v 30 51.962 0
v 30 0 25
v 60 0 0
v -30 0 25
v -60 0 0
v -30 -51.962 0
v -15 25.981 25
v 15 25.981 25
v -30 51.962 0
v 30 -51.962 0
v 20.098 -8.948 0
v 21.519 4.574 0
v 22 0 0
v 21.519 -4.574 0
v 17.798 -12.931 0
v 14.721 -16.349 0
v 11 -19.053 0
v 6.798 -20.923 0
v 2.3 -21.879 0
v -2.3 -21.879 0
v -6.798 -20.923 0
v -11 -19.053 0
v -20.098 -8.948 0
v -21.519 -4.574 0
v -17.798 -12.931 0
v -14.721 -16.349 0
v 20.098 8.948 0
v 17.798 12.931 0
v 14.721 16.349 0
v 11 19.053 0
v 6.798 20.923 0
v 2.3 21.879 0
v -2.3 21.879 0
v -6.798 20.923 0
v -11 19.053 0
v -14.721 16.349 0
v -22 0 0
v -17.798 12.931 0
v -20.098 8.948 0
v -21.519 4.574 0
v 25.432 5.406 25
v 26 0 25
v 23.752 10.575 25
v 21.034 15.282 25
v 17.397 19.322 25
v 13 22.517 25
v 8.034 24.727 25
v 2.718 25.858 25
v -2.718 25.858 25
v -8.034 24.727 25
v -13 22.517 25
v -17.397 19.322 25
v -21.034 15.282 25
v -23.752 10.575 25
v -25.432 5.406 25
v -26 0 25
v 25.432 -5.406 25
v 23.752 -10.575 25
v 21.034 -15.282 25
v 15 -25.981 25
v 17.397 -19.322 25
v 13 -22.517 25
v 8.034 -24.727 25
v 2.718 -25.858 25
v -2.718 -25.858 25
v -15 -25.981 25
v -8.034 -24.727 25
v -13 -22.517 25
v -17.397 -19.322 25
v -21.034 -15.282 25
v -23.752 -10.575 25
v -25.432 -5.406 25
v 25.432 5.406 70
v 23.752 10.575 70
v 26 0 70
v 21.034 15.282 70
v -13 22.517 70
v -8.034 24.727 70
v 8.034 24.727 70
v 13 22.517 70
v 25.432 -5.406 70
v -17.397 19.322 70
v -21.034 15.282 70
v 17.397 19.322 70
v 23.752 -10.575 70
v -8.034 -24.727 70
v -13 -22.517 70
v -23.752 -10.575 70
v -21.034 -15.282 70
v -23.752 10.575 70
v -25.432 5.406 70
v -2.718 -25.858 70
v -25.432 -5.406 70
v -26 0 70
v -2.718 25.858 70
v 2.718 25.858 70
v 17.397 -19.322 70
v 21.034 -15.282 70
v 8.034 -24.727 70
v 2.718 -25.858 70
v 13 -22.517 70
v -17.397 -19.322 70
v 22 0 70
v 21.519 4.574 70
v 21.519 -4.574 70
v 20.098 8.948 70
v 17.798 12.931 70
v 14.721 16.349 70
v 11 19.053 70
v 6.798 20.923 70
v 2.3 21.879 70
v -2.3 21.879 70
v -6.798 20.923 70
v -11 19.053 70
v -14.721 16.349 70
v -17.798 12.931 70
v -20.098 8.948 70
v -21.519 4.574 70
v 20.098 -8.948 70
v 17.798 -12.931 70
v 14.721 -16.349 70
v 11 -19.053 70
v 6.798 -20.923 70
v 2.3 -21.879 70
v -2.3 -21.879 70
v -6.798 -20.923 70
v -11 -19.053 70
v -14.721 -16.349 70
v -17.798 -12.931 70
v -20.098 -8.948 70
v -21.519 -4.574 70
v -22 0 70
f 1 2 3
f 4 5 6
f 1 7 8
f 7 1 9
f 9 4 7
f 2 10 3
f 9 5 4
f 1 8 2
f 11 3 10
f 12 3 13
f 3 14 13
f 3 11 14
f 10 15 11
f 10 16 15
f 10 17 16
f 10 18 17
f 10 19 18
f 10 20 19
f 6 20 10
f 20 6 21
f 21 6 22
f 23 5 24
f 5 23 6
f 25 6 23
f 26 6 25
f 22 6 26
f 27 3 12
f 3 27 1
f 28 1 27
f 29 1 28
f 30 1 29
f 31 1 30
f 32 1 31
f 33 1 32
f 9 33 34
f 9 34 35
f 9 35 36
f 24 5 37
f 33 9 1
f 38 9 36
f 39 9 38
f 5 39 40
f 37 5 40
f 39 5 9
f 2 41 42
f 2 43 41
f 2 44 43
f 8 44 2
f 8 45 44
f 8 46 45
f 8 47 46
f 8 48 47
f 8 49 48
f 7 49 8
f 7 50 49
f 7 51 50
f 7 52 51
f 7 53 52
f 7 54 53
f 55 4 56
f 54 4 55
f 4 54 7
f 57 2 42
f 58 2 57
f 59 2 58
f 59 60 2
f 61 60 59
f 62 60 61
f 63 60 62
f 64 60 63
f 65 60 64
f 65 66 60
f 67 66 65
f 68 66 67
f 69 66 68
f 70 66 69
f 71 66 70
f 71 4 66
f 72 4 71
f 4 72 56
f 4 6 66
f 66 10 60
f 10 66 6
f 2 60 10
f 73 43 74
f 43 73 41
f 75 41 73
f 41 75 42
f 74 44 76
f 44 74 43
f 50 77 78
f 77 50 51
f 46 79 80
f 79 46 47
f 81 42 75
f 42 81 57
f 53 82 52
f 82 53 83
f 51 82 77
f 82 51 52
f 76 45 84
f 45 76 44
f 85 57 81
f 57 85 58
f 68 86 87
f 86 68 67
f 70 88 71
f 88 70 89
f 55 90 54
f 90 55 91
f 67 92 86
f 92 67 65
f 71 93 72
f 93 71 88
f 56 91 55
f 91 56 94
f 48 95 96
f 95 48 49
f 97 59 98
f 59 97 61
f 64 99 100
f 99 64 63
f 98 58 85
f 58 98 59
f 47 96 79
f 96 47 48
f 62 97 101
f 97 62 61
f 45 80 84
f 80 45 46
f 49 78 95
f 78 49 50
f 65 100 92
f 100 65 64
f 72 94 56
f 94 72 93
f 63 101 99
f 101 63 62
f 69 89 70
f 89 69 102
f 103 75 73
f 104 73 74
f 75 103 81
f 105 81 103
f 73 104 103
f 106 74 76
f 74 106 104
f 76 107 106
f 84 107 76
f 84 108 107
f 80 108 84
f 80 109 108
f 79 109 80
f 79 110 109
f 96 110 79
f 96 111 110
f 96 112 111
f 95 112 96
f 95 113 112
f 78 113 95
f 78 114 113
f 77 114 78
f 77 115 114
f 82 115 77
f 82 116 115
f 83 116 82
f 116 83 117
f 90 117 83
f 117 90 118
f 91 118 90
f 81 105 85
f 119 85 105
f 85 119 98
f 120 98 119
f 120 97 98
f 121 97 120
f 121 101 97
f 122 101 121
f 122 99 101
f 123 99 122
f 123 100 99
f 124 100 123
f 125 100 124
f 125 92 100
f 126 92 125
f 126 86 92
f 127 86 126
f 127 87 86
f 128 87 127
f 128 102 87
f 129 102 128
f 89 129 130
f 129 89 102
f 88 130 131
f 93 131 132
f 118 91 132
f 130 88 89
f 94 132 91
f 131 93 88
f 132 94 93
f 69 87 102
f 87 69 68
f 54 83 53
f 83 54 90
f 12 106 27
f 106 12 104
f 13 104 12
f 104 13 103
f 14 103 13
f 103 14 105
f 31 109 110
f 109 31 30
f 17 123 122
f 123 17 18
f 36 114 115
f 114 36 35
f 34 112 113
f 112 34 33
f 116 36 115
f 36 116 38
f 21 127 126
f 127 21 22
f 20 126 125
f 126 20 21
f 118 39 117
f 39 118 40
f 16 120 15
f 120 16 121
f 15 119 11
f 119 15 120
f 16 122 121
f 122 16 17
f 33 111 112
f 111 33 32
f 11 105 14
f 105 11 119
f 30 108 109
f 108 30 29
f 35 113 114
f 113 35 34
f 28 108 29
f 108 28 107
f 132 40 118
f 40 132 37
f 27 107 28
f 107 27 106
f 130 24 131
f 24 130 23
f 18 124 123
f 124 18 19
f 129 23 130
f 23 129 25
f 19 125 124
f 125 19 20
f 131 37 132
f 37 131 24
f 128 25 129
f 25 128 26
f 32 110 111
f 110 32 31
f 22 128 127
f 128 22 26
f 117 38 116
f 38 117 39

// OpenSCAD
difference() {
	cylinder(25,60, 30,$fn=6);
    cylinder (h = 70, r=24, center = false);
}

difference(){
	cylinder (h = 70, r=26, center = false);
    cylinder (h = 70, r=22, center = false);   
}
